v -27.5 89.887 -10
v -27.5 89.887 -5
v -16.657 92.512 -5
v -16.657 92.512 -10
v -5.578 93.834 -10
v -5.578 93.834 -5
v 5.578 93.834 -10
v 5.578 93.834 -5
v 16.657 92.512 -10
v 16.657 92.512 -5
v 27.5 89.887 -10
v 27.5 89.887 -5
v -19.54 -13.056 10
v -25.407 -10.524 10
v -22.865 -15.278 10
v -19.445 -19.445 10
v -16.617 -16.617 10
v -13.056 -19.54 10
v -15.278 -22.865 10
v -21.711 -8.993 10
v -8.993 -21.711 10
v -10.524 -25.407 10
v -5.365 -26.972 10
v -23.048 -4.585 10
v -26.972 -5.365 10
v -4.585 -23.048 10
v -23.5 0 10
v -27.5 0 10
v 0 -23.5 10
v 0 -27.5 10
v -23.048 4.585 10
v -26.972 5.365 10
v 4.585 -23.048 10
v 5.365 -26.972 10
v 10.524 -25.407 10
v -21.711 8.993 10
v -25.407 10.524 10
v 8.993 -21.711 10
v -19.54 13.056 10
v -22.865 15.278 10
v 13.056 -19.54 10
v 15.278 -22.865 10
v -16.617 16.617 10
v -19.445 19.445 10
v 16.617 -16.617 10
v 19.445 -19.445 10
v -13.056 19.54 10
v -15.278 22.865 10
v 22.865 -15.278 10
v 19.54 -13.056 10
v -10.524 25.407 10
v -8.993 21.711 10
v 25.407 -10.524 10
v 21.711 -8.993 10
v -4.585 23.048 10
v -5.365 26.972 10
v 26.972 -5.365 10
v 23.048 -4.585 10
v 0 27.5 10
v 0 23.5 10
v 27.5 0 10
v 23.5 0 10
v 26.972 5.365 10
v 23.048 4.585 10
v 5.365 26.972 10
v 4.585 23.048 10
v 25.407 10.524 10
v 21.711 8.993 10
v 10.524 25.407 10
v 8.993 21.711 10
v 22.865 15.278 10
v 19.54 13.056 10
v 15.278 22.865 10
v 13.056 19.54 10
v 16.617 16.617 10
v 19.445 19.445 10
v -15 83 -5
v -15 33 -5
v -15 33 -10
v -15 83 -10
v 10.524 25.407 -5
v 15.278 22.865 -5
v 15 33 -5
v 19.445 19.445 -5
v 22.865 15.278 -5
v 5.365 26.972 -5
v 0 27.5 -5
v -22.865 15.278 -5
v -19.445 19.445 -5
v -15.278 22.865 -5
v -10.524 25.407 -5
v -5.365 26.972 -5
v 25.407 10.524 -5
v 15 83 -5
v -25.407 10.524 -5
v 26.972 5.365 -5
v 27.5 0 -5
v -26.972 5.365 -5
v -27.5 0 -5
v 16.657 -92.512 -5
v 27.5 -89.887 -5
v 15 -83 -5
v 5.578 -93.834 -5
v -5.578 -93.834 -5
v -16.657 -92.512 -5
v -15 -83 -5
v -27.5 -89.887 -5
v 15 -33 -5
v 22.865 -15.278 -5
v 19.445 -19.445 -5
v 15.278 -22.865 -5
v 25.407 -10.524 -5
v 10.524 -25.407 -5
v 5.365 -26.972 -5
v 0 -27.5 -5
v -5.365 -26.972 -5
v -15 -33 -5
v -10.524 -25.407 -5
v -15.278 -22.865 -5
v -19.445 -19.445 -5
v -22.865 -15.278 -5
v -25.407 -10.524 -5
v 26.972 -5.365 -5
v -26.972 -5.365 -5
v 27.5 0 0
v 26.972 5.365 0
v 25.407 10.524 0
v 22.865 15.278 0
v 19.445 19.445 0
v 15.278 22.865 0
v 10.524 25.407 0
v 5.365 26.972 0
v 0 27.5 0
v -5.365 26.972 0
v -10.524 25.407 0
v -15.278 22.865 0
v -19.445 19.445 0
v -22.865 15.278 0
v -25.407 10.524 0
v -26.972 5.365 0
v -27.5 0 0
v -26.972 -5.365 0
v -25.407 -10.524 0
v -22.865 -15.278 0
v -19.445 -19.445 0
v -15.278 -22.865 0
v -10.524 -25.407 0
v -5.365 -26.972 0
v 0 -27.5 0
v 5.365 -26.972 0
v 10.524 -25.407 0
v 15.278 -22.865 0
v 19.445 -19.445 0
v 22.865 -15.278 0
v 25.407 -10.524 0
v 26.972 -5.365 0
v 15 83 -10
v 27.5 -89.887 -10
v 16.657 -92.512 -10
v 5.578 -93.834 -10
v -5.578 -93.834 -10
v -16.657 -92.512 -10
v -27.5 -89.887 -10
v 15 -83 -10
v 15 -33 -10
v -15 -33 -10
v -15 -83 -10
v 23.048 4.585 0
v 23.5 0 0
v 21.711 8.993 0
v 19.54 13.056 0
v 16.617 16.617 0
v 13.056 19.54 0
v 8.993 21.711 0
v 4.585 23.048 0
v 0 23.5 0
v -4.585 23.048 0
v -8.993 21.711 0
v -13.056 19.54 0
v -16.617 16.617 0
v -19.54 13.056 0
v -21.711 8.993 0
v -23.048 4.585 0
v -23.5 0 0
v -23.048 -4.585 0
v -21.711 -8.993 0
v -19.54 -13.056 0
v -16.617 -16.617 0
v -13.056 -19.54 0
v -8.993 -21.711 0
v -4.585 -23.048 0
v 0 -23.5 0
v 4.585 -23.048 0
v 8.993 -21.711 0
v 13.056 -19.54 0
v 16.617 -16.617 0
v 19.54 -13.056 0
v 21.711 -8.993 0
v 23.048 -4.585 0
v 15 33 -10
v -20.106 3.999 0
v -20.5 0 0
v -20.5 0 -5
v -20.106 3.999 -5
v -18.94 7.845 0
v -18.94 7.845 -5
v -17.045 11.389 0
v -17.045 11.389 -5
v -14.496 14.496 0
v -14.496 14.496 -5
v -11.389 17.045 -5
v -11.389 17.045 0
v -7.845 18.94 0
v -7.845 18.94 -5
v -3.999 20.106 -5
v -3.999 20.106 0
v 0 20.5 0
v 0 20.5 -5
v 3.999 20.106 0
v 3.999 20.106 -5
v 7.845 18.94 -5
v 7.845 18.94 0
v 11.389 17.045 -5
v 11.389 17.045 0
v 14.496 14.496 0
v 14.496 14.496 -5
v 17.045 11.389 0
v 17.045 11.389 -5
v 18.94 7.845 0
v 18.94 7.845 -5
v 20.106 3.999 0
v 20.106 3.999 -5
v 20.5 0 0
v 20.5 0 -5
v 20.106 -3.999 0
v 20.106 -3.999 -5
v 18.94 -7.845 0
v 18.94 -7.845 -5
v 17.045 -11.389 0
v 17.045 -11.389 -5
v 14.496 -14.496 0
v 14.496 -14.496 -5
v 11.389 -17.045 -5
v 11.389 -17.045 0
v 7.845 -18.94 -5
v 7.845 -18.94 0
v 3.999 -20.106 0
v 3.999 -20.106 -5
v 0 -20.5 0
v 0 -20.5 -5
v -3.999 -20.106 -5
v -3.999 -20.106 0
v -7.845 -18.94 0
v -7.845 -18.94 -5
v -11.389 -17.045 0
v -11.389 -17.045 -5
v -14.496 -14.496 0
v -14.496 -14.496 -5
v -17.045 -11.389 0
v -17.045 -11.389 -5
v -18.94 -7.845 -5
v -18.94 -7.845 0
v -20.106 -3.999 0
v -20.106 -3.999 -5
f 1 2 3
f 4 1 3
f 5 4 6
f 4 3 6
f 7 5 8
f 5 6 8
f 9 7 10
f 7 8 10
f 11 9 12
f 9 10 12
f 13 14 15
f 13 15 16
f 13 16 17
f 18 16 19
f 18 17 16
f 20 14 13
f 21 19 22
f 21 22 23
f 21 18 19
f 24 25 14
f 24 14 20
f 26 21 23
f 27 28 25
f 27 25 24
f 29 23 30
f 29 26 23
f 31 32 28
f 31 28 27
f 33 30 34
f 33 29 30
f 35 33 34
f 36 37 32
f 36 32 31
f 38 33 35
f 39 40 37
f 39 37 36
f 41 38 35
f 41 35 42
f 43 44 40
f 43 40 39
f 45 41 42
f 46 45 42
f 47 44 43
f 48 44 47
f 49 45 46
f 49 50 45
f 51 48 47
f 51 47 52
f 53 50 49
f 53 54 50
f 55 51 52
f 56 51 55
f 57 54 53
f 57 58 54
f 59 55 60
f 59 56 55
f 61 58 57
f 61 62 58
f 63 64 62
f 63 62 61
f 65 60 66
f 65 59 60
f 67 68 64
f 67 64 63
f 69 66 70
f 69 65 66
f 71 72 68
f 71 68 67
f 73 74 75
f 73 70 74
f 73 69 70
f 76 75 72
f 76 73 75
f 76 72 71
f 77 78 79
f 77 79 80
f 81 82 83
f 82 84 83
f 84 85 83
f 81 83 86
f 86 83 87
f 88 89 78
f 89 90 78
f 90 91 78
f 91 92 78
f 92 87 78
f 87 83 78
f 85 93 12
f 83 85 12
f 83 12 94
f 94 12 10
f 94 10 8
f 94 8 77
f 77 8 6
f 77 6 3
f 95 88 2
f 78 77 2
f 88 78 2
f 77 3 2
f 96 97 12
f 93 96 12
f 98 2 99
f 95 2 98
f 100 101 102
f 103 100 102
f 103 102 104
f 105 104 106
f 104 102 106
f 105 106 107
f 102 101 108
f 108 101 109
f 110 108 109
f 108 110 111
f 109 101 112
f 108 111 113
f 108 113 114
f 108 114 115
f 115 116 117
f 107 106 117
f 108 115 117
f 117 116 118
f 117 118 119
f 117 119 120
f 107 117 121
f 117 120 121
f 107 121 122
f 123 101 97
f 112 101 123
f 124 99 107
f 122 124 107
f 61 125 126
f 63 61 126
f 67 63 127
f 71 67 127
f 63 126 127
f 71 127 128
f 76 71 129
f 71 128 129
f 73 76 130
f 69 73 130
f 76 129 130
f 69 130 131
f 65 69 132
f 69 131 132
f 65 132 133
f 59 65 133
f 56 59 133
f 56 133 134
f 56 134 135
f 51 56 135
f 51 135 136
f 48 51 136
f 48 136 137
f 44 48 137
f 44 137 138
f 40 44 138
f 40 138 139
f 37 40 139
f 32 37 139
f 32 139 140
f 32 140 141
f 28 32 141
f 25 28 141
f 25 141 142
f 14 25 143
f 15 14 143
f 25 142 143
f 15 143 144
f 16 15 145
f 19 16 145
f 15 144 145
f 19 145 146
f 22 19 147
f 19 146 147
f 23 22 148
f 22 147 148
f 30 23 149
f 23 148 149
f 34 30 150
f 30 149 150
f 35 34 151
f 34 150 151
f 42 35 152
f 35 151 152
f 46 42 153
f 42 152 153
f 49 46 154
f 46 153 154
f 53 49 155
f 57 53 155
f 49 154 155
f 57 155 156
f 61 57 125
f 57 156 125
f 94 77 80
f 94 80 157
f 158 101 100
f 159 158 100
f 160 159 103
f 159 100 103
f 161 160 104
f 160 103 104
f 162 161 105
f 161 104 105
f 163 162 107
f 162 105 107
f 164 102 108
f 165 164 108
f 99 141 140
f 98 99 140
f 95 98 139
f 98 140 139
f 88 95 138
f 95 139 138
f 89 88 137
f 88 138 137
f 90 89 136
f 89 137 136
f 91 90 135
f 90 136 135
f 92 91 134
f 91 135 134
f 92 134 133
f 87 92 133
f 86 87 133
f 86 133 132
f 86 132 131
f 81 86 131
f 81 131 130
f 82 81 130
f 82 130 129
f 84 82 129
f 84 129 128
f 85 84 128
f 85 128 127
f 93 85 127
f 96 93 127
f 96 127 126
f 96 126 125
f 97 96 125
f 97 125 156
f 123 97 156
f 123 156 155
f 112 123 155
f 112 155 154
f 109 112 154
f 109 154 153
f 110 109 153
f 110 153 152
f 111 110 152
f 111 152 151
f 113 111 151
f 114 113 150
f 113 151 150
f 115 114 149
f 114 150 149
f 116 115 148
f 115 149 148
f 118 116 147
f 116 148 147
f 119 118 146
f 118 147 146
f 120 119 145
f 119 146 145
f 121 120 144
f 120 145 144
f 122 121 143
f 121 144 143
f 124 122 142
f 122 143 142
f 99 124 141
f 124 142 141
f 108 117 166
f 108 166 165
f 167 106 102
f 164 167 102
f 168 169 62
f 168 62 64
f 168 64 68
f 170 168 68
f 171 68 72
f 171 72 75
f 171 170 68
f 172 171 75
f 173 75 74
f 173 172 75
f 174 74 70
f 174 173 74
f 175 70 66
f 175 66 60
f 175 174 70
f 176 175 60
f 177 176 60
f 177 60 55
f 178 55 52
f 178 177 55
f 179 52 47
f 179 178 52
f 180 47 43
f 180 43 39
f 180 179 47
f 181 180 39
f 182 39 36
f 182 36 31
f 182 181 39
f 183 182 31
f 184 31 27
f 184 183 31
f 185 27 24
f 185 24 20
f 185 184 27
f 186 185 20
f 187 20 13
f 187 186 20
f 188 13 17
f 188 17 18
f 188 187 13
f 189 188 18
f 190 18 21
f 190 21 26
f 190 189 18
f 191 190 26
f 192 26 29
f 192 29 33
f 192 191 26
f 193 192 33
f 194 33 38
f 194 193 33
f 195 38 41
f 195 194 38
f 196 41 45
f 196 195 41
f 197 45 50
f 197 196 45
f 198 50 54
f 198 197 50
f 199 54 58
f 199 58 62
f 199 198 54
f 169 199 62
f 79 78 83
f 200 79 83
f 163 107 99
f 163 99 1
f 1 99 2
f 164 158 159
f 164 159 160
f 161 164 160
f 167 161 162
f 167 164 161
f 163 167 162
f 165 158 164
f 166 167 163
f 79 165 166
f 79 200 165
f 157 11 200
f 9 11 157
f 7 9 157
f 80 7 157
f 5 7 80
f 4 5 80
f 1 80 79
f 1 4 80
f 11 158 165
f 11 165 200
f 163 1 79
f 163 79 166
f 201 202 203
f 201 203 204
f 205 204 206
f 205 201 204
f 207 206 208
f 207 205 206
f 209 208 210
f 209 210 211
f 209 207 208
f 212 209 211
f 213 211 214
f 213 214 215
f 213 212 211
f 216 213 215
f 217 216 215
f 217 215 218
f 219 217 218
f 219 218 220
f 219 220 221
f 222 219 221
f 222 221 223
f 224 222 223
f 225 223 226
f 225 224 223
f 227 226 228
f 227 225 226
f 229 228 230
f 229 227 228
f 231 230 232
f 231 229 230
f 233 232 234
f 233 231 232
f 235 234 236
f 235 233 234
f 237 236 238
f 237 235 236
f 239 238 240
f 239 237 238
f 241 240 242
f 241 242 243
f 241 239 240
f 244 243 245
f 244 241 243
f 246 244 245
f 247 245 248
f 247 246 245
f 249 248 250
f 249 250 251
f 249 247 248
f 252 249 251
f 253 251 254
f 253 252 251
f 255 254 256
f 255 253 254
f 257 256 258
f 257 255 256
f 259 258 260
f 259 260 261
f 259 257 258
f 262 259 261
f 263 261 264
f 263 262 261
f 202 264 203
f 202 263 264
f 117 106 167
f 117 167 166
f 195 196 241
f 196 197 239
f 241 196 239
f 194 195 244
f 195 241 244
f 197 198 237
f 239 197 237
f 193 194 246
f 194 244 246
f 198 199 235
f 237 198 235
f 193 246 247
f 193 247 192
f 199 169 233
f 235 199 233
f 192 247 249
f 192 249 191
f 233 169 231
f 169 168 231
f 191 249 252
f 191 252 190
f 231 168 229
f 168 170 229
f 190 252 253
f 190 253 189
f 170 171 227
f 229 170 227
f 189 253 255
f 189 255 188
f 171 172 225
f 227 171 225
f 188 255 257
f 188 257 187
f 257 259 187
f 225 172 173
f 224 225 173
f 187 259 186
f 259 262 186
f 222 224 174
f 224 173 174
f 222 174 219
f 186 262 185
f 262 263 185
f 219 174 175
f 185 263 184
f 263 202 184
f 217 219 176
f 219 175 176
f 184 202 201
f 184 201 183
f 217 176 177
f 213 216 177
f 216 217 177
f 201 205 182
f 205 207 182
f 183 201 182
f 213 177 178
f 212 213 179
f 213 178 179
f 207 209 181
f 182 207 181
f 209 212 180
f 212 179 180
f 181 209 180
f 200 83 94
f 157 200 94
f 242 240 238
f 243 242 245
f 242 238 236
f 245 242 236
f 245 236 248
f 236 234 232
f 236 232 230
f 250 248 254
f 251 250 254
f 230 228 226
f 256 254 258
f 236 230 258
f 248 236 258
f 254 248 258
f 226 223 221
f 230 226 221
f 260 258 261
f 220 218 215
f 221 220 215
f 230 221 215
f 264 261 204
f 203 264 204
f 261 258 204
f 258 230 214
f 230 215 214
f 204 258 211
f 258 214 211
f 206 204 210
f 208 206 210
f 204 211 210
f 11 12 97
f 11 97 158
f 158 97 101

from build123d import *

# Parameters (mm, degrees)
SKETCH1_R           = 27.5
SKETCH1_R_2         = 23.5
BOSS_EXTRUDE1_DEPTH = 10
SKETCH2_R           = 27.5
SKETCH2_R_2         = 20.5
BOSS_EXTRUDE2_DEPTH = 5
BOSS_EXTRUDE3_DEPTH = 5
SKETCH4_W           = 30
SKETCH4_H           = 50
CUT_EXTRUDE1_DEPTH  = 10


with BuildPart() as part:
    # Sketch1 → Boss-Extrude1 (new body)
    with BuildSketch(Plane.XY):
        Circle(SKETCH1_R)
        Circle(SKETCH1_R_2, mode=Mode.SUBTRACT)
    extrude(amount=BOSS_EXTRUDE1_DEPTH)

    # Sketch2 → Boss-Extrude2 (add)
    with BuildSketch(Plane(origin=(0, 0, 0), x_dir=(-1, 0, 0), z_dir=(0, 0, -1))):
        Circle(SKETCH2_R)
        Circle(SKETCH2_R_2, mode=Mode.SUBTRACT)
    extrude(amount=BOSS_EXTRUDE2_DEPTH)

    # Sketch3 → Boss-Extrude3 (add)
    with BuildSketch(Plane(origin=(0, 0, -5), x_dir=(-1, 0, 0), z_dir=(0, 0, -1))):
        with BuildLine():
            Line((-27.5, 89.887429599), (-27.5, -89.887429599))
            ThreePointArc((-27.5, -89.887429599), (0, -94), (27.5, -89.887429599))
            Line((27.5, -89.887429599), (27.5, 89.887429599))
            ThreePointArc((27.5, 89.887429599), (0, 94), (-27.5, 89.887429599))
        make_face()
    extrude(amount=BOSS_EXTRUDE3_DEPTH)

    # Sketch4 → Cut-Extrude1 (cut)
    with BuildSketch(Plane.XY.offset(-5)):
        with Locations((0, -58)):
            Rectangle(SKETCH4_W, SKETCH4_H)
        with Locations((0, 58)):
            Rectangle(SKETCH4_W, SKETCH4_H)
    extrude(amount=-CUT_EXTRUDE1_DEPTH, mode=Mode.SUBTRACT)


solid = part.part
